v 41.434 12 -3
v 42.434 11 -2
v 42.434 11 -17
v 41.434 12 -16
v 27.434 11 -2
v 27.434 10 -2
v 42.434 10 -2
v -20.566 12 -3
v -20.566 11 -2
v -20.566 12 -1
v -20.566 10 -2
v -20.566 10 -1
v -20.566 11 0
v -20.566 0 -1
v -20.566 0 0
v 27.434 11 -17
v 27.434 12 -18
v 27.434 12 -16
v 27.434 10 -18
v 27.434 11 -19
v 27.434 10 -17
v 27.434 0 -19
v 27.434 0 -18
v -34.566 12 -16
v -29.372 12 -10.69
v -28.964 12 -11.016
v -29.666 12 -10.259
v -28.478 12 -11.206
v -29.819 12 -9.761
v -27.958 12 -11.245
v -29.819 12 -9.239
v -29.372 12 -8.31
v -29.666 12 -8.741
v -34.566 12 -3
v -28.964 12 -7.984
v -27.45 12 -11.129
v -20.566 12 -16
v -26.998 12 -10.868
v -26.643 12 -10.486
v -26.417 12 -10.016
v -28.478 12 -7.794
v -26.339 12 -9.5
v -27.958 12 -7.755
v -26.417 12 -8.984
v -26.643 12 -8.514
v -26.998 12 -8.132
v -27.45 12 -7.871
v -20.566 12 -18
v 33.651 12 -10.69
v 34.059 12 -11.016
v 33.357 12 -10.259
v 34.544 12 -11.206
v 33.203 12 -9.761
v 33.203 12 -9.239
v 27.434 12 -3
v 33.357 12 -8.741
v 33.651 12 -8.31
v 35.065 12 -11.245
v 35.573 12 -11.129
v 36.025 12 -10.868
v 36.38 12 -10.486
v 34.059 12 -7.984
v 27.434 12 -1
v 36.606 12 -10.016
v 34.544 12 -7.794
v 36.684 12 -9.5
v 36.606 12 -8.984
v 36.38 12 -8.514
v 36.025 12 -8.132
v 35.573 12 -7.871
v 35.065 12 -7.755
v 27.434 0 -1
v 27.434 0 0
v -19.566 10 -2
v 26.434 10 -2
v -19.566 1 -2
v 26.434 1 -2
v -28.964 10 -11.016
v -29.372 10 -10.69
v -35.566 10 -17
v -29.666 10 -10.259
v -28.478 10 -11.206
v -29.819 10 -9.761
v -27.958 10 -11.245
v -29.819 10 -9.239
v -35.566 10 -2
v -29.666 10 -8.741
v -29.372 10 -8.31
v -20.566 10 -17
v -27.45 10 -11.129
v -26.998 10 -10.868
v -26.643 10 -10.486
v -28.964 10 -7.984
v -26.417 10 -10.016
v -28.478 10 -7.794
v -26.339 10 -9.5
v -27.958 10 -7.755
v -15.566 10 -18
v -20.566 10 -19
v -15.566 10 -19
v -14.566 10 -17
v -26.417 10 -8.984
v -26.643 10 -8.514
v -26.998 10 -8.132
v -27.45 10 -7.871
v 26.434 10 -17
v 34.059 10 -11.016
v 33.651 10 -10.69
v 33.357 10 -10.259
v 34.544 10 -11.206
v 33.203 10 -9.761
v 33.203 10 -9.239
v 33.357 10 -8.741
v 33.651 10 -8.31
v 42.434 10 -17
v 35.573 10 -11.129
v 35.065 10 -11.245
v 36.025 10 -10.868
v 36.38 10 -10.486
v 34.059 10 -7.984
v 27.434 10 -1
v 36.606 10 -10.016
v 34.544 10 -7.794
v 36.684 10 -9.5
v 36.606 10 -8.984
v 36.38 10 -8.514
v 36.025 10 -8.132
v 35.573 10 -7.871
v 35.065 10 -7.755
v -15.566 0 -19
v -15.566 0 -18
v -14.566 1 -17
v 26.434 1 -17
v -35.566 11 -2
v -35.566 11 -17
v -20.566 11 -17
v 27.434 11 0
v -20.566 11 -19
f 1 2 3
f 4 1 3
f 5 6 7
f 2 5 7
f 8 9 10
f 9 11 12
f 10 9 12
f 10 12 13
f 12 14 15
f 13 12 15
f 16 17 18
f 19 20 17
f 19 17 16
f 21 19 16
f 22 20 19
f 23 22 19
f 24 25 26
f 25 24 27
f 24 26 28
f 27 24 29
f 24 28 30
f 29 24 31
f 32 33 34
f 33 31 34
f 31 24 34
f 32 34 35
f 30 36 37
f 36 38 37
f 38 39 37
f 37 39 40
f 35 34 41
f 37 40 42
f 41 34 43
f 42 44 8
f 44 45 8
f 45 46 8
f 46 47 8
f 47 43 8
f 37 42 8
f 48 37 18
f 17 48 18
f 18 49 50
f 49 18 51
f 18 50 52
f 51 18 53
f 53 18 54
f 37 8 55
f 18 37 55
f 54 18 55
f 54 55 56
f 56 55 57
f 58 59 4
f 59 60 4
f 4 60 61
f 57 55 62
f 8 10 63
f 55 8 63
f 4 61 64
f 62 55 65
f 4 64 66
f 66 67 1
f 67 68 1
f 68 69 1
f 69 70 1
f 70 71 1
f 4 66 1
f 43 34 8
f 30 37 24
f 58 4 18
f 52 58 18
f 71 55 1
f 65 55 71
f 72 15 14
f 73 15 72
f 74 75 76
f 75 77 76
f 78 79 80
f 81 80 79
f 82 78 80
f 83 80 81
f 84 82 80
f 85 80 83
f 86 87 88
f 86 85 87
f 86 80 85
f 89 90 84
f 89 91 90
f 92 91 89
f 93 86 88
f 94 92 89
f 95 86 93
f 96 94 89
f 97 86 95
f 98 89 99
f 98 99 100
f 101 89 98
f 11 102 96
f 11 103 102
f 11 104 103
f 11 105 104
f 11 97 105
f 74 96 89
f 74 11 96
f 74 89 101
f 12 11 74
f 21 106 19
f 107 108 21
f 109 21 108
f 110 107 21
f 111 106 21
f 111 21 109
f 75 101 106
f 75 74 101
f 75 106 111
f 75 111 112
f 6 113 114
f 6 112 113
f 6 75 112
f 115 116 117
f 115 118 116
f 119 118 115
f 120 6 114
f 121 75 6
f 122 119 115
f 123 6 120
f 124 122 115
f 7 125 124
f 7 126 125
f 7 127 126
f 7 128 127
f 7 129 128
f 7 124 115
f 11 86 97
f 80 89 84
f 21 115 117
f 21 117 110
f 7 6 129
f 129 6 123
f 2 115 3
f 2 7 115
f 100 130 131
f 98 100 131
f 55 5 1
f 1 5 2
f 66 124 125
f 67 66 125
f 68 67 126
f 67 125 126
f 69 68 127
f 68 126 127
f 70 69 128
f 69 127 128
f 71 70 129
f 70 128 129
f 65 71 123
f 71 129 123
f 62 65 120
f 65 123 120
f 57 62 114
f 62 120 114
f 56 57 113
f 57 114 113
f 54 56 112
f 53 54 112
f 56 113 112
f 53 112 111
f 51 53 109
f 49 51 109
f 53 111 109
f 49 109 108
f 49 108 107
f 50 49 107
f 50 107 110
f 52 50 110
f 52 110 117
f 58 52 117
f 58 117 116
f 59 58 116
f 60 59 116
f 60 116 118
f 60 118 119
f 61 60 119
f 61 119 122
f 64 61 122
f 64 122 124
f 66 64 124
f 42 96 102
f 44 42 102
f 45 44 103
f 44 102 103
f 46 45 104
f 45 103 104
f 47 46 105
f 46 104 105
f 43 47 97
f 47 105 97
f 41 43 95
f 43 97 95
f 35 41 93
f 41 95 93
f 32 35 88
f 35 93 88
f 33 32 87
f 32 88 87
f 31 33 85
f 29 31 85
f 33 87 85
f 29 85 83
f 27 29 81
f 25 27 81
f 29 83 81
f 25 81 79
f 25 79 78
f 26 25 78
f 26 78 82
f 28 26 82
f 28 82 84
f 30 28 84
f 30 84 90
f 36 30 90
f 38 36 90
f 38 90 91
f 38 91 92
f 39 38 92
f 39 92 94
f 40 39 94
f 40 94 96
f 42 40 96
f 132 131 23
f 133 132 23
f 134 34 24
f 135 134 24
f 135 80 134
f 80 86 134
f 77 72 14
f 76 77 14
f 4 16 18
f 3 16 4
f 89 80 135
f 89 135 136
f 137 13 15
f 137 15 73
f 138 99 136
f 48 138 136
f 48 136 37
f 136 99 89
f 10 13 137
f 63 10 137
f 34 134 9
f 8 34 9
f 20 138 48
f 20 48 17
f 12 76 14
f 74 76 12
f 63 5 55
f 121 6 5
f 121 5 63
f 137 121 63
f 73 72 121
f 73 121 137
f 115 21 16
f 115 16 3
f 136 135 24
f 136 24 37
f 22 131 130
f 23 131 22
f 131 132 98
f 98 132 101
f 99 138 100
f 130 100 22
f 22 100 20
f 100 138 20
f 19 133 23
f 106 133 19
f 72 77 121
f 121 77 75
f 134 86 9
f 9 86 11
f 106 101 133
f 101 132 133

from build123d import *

# Parameters (mm, degrees)
F0_W      = 78
F0_H      = 12
F1_DEPTH  = 19
F2_R      = 1.75
F3_DEPTH  = 10
F3_FACE_W = 15
F3_FACE_H = 2
F2_W      = 15
F2_H      = 2
F4_DEPTH  = 12
F5_SIZE   = 0.99999


# Not quite as in the source:
# - a fillet or chamfer is up to 0.001 mm smaller than in the source, because OpenCascade refuses the exact size


with BuildPart() as f1:
    # F0 (on Top) → F1 (new body)
    with BuildSketch(Plane.XY):
        with Locations((3.4338701516, 6)):
            Rectangle(F0_W, F0_H)
    extrude(amount=-F1_DEPTH)

    # F2 (on face) → F3 (cut)
    with BuildSketch(Plane.XZ):
        Polygon((-35.5661298484, -17), (-20.5661298484, -17), (-20.5661298484, -19), (-15.5661298484, -19), (-15.5661298484, -17), (27.4338701516, -17), (42.4338701516, -17), (42.4338701516, -2), (27.4338701516, -2), (-20.5661298484, -2), (-35.5661298484, -2), align=None)
        with Locations((-28.0890100524, -9.5)):
            Circle(F2_R, mode=Mode.SUBTRACT)
        with Locations((34.9338701516, -9.5)):
            Circle(F2_R, mode=Mode.SUBTRACT)
    extrude(amount=-F3_DEPTH, mode=Mode.SUBTRACT)

    # F3_face (on face) + F2 (on face) → F4 (cut, through all)
    with BuildSketch(Plane(origin=(-28.0661298484, 0, -18), x_dir=(1, 0, 0), z_dir=(0, -1, 0))):
        Rectangle(F3_FACE_W, F3_FACE_H)
    with BuildSketch(Plane.XZ):
        with Locations((-28.0661298484, -1)):
            Rectangle(F2_W, F2_H)
        with Locations((34.9338701516, -1)):
            Rectangle(F2_W, F2_H)
        with Locations((34.9338701516, -18)):
            Rectangle(F2_W, F2_H)
        with Locations((-28.0890100524, -9.5)):
            Circle(F2_R)
        with Locations((34.9338701516, -9.5)):
            Circle(F2_R)
    extrude(amount=-F4_DEPTH, mode=Mode.SUBTRACT)

    # F5 (size 1 in the source; OpenCascade refuses exactly that, so slightly less here)
    f5_edges = [f1.edges().sort_by_distance(p)[0] for p in [
        (-35.56613, 12, -9.5),
        (-28.06613, 12, -2),
        (3.43387, 12, -19),
        (34.93387, 12, -17),
        (42.43387, 12, -9.5),
        (34.93387, 12, -2),
        (3.43387, 12, 0),
        (3.43387, 0, -2),
        (5.93387, 0, -17),
        (27.43387, 5, -17),
        (27.43387, 5, -2),
        (-15.56613, 5, -17),
        (-20.56613, 5, -2),
        (-28.06613, 12, -17),
    ]]
    chamfer(f5_edges, length=F5_SIZE)


solid = f1.part
